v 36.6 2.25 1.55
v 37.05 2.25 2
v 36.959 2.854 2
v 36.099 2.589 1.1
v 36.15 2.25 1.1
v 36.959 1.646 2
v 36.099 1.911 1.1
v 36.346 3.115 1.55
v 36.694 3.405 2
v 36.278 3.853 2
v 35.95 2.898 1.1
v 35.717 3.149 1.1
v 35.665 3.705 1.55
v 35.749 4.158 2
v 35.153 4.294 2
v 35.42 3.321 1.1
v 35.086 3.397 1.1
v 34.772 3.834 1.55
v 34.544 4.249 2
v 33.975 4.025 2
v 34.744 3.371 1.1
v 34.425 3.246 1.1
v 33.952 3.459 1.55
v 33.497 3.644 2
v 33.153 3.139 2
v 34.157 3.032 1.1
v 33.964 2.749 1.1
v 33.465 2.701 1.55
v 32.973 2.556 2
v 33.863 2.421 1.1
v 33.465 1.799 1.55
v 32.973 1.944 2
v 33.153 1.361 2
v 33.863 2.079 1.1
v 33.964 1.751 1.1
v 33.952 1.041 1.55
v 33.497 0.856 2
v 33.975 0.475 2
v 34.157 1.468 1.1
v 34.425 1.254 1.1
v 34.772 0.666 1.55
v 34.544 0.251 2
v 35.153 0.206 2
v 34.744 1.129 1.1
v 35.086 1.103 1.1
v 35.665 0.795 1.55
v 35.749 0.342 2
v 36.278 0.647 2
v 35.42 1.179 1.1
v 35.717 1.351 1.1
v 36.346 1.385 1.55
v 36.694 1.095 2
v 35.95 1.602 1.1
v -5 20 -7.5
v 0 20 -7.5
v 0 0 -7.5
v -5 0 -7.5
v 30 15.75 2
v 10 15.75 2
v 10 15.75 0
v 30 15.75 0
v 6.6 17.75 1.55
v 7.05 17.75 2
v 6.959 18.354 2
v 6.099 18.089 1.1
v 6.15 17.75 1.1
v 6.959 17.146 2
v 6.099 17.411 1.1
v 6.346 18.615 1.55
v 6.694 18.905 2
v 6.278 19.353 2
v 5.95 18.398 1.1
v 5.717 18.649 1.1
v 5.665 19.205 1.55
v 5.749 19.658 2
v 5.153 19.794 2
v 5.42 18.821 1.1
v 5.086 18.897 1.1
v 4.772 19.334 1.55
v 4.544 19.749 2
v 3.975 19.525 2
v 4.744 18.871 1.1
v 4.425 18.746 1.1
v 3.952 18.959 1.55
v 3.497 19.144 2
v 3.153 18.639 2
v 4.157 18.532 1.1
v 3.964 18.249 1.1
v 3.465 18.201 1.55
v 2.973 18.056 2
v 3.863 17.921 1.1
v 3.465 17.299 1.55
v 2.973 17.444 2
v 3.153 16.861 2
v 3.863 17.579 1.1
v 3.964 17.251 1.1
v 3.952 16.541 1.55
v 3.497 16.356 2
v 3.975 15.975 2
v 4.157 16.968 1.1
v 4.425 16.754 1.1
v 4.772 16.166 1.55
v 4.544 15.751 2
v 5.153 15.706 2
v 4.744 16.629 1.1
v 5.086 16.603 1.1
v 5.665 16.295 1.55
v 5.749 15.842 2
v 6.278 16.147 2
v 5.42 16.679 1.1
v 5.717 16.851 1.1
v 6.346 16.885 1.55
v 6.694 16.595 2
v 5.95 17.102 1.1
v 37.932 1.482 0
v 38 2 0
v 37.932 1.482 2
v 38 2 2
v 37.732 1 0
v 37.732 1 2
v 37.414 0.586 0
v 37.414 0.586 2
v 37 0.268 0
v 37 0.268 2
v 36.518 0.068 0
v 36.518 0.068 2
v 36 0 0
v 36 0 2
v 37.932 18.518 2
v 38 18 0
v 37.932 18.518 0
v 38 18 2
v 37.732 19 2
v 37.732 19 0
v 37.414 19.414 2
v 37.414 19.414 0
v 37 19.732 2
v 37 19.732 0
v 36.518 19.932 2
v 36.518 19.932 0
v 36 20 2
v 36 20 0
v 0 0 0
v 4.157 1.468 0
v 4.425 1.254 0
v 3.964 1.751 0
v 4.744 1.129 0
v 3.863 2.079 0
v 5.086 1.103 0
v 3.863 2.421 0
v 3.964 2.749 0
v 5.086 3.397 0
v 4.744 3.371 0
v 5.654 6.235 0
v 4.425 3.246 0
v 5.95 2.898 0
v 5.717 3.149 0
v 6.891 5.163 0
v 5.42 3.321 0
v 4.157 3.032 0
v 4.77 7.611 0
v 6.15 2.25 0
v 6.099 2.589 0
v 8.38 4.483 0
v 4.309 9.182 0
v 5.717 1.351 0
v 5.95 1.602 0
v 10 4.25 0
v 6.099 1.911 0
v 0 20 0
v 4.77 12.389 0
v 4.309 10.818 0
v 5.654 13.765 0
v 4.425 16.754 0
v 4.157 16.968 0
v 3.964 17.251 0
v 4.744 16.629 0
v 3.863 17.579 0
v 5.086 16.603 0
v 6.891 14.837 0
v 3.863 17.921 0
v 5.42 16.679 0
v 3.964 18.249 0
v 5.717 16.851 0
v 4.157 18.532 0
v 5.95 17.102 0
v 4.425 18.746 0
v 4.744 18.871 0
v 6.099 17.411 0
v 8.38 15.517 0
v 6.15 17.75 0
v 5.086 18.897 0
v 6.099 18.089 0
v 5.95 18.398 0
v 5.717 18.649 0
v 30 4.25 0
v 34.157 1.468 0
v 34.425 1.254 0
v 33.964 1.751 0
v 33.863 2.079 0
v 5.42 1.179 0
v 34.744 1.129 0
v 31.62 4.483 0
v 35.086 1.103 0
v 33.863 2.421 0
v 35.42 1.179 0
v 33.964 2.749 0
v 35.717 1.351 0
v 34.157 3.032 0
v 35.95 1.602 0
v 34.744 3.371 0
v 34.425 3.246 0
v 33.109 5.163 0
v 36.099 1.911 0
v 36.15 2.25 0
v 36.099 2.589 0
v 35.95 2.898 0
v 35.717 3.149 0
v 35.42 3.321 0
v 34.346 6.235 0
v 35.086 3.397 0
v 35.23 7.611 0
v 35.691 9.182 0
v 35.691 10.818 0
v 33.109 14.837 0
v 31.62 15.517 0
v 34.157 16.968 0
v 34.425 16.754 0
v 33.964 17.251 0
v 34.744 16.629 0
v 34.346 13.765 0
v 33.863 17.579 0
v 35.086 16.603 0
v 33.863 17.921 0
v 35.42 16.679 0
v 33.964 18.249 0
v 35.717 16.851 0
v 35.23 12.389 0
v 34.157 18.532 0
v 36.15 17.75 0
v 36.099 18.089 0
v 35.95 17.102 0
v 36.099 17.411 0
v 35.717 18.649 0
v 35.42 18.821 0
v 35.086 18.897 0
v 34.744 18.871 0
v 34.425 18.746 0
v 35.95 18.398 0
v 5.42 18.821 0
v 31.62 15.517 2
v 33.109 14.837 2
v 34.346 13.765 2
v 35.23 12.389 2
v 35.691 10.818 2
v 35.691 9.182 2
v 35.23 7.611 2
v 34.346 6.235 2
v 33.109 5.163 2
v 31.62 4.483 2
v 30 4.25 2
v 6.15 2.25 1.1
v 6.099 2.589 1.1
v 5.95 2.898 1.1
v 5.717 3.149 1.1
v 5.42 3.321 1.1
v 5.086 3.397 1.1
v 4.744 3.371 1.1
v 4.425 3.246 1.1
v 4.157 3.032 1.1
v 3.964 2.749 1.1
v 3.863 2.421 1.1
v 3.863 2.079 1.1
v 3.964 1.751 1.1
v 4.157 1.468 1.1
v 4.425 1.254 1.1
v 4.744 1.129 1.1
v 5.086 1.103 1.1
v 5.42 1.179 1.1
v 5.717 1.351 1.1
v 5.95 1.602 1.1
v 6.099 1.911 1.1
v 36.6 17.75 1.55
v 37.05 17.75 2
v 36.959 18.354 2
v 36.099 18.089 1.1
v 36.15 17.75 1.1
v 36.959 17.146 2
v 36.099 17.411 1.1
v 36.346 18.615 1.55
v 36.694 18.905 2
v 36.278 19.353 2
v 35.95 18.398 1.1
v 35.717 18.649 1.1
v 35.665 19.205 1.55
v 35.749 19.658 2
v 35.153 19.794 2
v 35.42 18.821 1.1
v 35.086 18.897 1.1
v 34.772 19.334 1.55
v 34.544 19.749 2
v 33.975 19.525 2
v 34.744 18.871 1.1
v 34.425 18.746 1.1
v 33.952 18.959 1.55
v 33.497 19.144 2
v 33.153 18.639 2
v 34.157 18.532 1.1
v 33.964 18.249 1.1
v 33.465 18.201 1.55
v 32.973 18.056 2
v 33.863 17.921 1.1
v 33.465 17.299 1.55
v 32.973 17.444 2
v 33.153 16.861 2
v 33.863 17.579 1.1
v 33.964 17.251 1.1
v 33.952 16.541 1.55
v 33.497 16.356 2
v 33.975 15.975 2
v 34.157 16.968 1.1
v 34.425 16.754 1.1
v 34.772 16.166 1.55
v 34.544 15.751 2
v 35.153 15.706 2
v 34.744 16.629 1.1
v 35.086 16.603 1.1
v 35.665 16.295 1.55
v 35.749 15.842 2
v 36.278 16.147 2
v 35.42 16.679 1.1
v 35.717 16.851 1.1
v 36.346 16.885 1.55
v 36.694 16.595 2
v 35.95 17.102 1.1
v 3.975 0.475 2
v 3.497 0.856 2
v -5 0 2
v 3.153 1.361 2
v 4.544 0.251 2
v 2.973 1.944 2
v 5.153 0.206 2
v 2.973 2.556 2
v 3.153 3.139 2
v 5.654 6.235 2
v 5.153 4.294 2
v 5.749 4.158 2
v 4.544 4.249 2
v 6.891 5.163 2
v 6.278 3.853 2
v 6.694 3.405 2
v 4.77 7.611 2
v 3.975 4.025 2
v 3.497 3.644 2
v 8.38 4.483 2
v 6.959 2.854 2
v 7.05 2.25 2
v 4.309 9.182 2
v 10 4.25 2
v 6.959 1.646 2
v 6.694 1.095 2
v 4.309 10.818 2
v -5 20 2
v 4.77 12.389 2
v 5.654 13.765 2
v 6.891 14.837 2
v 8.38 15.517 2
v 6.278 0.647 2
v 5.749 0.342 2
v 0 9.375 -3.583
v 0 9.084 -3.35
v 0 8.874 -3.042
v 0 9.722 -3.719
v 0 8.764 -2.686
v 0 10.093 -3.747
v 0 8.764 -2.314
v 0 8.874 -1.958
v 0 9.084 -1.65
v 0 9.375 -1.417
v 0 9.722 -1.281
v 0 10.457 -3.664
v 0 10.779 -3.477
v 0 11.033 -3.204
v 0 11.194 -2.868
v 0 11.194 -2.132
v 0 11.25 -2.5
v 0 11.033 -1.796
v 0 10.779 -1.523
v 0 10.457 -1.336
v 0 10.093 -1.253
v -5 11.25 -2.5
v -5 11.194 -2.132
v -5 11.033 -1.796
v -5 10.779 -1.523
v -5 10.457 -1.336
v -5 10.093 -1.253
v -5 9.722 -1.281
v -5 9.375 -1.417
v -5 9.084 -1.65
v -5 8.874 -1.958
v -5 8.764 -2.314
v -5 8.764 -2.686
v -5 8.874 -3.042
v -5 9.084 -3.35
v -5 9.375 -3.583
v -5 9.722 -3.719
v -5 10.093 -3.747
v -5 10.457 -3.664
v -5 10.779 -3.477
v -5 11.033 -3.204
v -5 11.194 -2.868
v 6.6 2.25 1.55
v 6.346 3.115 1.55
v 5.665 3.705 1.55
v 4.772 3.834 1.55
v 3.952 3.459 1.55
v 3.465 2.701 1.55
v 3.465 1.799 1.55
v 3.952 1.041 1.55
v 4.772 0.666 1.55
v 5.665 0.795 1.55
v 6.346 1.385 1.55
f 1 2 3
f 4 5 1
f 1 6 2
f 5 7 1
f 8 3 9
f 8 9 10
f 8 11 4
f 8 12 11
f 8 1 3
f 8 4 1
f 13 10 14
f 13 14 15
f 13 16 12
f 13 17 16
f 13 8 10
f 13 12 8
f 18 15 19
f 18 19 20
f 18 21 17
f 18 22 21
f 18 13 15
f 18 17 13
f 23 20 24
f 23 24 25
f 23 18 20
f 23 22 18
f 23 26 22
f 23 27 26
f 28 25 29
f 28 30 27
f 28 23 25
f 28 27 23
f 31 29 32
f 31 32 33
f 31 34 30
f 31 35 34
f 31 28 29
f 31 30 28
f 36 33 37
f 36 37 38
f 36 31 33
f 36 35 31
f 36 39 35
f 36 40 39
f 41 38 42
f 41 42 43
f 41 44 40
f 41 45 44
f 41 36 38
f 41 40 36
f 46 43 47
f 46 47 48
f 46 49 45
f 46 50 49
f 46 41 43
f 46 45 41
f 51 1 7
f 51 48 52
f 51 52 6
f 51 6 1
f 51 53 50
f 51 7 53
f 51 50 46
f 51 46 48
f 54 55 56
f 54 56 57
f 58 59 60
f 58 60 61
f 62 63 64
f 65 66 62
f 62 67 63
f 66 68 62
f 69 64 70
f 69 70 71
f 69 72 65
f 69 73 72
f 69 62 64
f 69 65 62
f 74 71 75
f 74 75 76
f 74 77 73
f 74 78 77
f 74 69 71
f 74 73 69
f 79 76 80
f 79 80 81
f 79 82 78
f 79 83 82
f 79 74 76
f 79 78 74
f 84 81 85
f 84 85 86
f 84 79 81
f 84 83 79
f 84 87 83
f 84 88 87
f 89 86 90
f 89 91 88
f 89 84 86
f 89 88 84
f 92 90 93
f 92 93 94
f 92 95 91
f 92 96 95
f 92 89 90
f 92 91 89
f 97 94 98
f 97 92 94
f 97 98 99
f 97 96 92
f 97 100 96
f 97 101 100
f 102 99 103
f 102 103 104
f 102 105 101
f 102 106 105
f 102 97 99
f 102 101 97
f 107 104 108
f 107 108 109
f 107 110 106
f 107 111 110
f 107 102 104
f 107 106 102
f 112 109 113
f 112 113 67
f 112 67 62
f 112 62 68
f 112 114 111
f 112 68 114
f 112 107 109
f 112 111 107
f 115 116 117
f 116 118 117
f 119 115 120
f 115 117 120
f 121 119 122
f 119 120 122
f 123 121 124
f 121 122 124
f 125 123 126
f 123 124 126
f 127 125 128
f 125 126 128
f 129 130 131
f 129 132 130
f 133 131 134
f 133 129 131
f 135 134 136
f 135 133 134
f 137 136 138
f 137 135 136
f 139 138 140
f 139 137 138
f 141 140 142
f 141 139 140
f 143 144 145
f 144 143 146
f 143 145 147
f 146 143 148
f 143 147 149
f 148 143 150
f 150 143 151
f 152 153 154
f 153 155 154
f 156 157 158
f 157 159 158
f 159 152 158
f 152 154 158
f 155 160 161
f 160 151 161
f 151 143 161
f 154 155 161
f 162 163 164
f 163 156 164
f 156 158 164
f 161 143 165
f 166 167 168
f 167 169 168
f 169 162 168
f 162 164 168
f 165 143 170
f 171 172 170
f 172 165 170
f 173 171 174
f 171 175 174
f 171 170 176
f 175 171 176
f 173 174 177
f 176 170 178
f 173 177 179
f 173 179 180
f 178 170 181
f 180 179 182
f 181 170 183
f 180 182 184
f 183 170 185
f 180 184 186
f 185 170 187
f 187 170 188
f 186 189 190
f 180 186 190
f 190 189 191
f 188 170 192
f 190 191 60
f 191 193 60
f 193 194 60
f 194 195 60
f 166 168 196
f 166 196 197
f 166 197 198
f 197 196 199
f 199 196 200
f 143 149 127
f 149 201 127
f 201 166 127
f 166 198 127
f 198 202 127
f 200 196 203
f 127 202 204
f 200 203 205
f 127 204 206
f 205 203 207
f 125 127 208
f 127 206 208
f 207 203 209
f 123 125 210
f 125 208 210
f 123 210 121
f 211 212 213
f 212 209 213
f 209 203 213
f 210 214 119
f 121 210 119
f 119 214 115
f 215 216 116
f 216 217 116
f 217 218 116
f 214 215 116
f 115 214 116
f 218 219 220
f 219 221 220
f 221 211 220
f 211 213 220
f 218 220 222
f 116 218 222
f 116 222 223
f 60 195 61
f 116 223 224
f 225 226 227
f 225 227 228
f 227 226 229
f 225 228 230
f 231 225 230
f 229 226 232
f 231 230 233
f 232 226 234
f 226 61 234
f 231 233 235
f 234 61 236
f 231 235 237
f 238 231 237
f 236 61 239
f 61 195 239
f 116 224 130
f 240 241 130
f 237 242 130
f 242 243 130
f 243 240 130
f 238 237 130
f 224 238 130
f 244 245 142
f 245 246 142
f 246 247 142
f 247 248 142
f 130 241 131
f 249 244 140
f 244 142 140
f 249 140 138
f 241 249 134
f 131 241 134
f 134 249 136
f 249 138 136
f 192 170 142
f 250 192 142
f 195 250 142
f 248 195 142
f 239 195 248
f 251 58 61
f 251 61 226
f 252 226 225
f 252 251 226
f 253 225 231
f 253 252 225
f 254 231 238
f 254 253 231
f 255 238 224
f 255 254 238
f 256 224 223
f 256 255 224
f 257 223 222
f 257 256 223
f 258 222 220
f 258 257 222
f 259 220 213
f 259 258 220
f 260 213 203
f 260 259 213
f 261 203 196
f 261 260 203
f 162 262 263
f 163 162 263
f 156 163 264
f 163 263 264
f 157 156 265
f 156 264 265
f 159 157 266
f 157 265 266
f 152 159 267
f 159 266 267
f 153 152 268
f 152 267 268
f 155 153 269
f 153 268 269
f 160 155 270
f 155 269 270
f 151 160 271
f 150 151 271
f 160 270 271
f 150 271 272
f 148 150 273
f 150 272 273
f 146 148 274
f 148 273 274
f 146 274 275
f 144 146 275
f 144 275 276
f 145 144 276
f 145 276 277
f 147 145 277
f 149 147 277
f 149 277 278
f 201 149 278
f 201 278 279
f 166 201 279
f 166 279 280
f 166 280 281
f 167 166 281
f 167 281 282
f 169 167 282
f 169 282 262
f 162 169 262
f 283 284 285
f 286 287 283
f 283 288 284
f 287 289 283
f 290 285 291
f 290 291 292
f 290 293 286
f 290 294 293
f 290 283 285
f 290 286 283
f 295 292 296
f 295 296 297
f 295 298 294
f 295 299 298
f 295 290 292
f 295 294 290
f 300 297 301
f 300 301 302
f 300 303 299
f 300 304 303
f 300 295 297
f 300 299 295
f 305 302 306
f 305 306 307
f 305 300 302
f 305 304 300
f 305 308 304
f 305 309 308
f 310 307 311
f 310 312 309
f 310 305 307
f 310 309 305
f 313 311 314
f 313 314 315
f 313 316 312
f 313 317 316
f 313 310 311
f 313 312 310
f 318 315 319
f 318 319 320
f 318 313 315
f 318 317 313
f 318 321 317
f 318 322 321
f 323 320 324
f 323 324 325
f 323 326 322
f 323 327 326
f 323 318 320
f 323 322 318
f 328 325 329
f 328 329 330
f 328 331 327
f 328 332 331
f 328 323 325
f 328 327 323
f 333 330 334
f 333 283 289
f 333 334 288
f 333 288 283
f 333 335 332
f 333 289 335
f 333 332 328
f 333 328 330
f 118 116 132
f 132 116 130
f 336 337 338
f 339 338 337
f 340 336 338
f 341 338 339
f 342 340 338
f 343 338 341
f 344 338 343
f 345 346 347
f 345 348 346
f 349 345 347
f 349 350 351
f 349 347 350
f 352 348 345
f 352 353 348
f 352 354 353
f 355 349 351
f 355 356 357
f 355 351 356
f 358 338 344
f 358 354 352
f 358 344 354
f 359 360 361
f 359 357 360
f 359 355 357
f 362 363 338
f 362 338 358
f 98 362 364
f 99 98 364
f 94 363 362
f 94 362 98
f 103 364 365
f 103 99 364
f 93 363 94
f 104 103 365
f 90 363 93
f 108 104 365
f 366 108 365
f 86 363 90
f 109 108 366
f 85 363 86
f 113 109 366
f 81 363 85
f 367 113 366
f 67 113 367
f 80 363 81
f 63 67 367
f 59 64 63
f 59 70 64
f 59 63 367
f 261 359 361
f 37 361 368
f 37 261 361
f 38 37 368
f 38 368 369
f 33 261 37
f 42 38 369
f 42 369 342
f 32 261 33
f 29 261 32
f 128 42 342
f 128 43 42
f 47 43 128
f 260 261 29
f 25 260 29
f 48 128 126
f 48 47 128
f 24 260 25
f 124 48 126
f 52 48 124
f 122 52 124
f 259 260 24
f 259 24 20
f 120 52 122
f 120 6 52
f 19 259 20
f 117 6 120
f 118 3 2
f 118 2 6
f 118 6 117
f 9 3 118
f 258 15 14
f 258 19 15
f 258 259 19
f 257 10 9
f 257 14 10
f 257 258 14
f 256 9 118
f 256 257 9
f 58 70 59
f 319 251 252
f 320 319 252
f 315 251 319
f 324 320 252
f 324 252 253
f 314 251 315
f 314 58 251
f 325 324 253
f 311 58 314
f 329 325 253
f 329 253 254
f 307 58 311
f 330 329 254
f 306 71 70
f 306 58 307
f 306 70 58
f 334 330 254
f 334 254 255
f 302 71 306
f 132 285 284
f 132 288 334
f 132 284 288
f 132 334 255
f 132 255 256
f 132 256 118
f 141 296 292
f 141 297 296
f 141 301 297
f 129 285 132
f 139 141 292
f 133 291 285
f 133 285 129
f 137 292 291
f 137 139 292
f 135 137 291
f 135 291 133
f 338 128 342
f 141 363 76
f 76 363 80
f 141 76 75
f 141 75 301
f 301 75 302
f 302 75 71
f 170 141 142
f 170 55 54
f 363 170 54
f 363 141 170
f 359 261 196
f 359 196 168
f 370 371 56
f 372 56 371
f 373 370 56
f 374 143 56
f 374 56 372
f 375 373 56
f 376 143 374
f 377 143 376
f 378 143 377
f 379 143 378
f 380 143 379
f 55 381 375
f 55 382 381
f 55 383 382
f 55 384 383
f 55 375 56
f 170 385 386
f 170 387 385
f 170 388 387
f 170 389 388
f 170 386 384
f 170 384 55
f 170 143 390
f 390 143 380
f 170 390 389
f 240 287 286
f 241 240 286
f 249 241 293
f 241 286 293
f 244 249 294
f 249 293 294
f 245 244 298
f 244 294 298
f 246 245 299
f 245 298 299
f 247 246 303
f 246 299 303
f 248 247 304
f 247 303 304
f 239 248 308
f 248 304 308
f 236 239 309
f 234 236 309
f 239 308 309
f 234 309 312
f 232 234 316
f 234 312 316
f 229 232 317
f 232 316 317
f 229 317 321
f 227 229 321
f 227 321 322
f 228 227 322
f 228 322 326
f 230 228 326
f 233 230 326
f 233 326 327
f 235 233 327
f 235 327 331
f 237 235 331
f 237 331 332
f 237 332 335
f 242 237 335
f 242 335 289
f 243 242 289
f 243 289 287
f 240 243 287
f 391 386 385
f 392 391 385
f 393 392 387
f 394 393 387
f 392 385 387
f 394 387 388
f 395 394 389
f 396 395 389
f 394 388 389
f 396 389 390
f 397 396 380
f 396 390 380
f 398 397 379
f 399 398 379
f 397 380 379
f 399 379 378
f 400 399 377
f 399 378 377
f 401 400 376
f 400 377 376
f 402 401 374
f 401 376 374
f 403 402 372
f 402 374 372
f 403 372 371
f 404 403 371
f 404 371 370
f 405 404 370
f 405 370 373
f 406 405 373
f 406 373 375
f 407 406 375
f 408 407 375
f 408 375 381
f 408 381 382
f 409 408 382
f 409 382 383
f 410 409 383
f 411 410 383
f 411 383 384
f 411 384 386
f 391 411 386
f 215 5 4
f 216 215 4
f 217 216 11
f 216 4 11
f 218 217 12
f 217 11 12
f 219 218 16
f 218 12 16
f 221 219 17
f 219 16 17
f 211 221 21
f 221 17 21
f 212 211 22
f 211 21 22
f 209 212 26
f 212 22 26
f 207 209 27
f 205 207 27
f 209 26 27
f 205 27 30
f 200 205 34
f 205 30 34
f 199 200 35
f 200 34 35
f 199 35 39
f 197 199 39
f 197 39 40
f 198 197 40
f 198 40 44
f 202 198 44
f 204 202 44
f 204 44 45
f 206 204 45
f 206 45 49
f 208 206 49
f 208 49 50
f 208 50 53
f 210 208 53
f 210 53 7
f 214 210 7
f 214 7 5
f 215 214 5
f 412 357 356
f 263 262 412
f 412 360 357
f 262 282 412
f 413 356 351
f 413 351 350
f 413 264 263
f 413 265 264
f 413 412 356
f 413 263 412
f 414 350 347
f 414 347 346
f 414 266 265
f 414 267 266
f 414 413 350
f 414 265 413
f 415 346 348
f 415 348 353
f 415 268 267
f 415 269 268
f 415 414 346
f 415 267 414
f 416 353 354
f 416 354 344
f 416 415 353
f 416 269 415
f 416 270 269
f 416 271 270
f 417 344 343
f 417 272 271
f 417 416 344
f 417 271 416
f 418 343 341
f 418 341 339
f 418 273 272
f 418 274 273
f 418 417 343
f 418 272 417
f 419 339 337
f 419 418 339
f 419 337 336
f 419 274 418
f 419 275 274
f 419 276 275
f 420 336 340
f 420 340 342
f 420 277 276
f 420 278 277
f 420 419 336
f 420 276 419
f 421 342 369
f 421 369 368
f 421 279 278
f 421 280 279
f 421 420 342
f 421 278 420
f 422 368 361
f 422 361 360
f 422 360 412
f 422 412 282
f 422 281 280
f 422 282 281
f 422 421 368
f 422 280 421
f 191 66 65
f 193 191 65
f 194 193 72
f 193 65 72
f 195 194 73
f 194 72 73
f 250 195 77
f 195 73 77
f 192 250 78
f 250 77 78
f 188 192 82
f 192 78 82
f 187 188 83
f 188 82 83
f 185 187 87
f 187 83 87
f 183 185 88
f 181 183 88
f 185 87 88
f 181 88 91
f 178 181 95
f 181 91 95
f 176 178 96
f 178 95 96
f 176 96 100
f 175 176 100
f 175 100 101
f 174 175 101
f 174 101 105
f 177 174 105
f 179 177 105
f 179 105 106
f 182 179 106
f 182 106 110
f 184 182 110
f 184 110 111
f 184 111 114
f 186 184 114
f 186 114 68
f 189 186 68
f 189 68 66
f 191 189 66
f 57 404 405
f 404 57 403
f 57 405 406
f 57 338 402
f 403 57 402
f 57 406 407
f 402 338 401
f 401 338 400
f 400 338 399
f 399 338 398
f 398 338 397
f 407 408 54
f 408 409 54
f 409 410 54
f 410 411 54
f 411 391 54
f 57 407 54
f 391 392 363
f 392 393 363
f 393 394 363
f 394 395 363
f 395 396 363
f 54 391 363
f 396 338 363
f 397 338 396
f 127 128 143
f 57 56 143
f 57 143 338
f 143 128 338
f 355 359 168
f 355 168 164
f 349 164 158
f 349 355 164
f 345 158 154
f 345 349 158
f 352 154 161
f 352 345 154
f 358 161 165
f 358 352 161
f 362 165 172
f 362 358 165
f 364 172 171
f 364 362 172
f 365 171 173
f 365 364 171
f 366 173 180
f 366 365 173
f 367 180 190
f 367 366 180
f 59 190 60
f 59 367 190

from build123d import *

# Parameters (mm, degrees)
SKETCH1_W           = 38
SKETCH1_H           = 20
BOSS_EXTRUDE1_DEPTH = 2
SKETCH2_W           = 5
SKETCH2_H           = 20
BOSS_EXTRUDE2_DEPTH = 7
M3_TAPPED_HOLE1_D   = 2.5
SKETCH7_R           = 1.15
CUT_EXTRUDE1_DEPTH  = 7.5
CUT_EXTRUDE2_DEPTH  = 7.5
SKETCH9_W           = 5
SKETCH9_H           = 20
BOSS_EXTRUDE3_DEPTH = 2.5
FILLET1_R           = 2
CHAMFER1_SIZE       = 0.9


with BuildPart() as part:
    # Sketch1 → Boss-Extrude1 (new body)
    with BuildSketch(Plane.XY):
        with Locations((19, 10)):
            Rectangle(SKETCH1_W, SKETCH1_H)
    extrude(amount=BOSS_EXTRUDE1_DEPTH)

    # Sketch2 → Boss-Extrude2 (add)
    with BuildSketch(Plane.XY.offset(2)):
        with Locations((-2.5, 10)):
            Rectangle(SKETCH2_W, SKETCH2_H)
    extrude(amount=-BOSS_EXTRUDE2_DEPTH)

    # M3 Tapped Hole1 (through all)
    with Locations(Plane(origin=(-5, 10, -2.5), x_dir=(0, -1, 0), z_dir=(-1, 0, 0))):
        with Locations((0, 0)):
            Hole(M3_TAPPED_HOLE1_D / 2)

    # Sketch7 → Cut-Extrude1 (cut)
    with BuildSketch(Plane.XY.offset(2)):
        with Locations((35, 17.75)):
            Circle(SKETCH7_R)
        with Locations((5, 17.75)):
            Circle(SKETCH7_R)
        with Locations((35, 2.25)):
            Circle(SKETCH7_R)
        with Locations((5, 2.25)):
            Circle(SKETCH7_R)
    extrude(amount=-CUT_EXTRUDE1_DEPTH, mode=Mode.SUBTRACT)

    # Sketch8 → Cut-Extrude2 (cut)
    with BuildSketch(Plane.XY.offset(2)):
        with BuildLine():
            Line((30, 4.25), (10, 4.25))
            ThreePointArc((10, 4.25), (4.25, 10), (10, 15.75))
            Line((10, 15.75), (30, 15.75))
            ThreePointArc((30, 15.75), (35.75, 10), (30, 4.25))
        make_face()
    extrude(amount=-CUT_EXTRUDE2_DEPTH, mode=Mode.SUBTRACT)

    # Sketch9 → Boss-Extrude3 (add)
    with BuildSketch(Plane(origin=(0, 0, -5), x_dir=(-1, 0, 0), z_dir=(0, 0, -1))):
        with Locations((2.5, 10)):
            Rectangle(SKETCH9_W, SKETCH9_H)
    extrude(amount=BOSS_EXTRUDE3_DEPTH)

    # Fillet1
    fillet1_edges = [part.edges().sort_by_distance(p)[0] for p in [
        (38, 20, 1),
        (38, 0, 1),
    ]]
    fillet(fillet1_edges, radius=FILLET1_R)

    # Chamfer1
    chamfer1_edges = [part.edges().sort_by_distance(p)[0] for p in [
        (3.85, 17.75, 2),
        (33.85, 2.25, 2),
        (3.85, 2.25, 2),
        (33.85, 17.75, 2),
    ]]
    chamfer(chamfer1_edges, length=CHAMFER1_SIZE)


solid = part.part
